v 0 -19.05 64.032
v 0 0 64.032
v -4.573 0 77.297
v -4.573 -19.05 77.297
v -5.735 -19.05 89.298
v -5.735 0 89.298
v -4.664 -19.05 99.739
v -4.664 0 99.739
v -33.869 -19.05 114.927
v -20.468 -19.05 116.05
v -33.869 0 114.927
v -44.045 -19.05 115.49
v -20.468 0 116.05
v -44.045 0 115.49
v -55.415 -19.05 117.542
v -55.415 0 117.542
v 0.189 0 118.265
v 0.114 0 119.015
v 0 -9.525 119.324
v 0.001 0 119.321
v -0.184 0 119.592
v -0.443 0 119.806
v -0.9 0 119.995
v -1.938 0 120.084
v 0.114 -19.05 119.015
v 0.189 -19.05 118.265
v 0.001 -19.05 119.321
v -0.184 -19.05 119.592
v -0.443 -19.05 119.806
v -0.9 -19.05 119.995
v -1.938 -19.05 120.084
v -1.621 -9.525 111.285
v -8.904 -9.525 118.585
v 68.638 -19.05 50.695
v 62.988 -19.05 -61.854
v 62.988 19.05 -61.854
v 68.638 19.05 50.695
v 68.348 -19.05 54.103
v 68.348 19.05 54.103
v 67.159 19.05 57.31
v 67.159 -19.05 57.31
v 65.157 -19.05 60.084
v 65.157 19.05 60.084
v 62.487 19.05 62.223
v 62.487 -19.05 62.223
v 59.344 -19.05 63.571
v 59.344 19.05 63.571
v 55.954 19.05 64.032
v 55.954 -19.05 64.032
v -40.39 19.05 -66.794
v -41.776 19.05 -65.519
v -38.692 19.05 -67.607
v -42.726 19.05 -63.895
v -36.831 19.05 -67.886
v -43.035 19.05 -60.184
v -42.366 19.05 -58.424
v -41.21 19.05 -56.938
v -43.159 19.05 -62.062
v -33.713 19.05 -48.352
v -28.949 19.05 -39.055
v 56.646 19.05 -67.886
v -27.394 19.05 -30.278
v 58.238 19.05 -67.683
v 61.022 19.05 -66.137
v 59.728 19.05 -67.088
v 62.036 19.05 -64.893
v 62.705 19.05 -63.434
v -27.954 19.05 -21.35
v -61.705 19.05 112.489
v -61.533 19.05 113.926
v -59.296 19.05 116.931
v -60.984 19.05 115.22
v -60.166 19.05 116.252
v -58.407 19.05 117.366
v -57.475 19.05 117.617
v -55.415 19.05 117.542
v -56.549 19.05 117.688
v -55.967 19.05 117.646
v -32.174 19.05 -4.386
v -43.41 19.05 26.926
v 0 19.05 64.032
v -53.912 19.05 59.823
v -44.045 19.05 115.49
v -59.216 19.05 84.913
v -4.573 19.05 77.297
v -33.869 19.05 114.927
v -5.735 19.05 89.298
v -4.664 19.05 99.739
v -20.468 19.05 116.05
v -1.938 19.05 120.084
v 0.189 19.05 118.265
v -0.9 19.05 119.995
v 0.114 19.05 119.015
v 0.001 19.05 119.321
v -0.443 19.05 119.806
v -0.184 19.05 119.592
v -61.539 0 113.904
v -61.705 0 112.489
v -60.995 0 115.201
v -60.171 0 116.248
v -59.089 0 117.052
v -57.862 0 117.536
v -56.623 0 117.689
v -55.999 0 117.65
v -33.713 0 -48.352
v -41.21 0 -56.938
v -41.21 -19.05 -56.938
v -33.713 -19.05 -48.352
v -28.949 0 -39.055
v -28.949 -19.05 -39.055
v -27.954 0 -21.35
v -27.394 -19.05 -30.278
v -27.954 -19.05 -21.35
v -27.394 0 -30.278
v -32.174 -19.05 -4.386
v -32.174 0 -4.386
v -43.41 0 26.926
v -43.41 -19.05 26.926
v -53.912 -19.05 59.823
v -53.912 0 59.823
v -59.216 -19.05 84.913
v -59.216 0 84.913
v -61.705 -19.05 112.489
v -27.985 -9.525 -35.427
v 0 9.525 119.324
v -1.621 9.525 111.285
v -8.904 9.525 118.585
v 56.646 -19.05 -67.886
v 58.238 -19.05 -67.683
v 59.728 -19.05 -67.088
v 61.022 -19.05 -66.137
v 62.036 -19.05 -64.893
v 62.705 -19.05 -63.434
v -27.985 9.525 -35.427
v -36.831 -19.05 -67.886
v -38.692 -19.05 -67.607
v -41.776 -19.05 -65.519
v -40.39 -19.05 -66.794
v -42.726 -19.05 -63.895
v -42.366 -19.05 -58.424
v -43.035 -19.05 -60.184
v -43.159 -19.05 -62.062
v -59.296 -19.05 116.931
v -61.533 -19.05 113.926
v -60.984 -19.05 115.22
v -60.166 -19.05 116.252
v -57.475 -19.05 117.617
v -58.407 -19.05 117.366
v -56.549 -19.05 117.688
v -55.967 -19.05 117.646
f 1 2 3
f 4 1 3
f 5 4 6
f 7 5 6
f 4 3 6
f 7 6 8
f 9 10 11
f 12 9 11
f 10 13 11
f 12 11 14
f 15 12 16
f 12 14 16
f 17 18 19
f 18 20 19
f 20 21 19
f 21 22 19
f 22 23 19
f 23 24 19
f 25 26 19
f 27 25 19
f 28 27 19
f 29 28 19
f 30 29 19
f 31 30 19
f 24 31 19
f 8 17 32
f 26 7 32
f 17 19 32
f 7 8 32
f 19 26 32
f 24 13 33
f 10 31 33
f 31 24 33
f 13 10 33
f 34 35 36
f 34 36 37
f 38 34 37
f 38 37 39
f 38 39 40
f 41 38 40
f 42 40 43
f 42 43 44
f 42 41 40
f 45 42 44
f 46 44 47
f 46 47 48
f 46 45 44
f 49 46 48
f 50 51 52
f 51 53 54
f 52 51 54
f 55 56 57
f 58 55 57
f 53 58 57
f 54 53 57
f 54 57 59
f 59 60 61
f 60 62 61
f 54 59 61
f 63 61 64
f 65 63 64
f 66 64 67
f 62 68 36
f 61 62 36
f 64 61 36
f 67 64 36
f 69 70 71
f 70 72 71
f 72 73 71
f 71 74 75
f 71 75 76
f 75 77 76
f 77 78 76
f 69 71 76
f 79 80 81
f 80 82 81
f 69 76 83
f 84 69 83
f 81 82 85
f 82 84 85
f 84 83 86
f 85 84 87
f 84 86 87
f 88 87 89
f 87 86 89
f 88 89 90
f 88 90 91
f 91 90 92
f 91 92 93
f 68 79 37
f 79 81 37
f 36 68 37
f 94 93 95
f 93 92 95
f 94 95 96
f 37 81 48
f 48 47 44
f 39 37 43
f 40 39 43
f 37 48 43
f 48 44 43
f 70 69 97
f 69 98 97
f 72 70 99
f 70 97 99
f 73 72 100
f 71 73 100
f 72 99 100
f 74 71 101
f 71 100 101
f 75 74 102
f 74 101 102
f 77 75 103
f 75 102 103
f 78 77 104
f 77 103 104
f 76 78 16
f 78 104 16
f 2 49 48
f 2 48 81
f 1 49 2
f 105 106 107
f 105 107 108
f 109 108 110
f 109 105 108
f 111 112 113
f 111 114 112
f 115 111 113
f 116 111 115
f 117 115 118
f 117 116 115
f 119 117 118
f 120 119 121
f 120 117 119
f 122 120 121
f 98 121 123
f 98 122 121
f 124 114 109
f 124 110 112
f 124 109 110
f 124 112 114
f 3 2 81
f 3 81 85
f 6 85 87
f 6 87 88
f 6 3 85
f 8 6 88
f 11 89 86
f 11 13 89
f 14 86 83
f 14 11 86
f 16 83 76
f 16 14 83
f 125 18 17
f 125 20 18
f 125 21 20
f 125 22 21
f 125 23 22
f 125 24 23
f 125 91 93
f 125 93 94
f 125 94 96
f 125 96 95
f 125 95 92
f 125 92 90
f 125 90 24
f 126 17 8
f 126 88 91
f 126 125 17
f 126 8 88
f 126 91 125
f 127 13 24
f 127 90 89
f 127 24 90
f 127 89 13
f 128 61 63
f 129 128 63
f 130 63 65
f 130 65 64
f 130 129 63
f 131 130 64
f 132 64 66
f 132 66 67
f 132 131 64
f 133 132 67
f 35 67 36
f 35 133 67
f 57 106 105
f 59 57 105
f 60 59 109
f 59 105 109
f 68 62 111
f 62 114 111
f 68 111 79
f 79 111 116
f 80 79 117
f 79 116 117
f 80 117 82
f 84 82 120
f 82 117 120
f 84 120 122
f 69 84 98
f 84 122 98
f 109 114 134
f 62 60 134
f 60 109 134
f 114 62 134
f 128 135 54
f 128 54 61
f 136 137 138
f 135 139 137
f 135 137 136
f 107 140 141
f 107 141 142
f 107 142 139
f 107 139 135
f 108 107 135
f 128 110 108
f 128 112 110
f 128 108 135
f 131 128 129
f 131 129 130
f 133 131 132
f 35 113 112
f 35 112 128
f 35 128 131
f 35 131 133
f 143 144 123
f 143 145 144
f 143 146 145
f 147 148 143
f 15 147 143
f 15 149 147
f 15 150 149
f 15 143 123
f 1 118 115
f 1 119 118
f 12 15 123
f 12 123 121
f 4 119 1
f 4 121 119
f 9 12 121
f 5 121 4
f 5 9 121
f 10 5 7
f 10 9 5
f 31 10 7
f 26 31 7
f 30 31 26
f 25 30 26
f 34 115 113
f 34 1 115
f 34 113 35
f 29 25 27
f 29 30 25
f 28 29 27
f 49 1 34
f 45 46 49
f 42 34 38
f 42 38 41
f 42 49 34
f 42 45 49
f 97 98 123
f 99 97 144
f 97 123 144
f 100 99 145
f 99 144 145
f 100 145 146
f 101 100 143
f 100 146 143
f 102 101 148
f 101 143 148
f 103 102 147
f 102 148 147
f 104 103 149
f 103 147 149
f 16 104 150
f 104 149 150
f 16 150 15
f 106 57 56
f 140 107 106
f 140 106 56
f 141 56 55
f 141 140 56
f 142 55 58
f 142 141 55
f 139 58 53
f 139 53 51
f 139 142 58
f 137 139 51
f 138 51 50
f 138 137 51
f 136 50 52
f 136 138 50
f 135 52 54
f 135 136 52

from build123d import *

# Parameters (mm, degrees)
F1_DEPTH = 19.05
F2_R     = 5.08


with BuildPart() as f1:
    # F0 (on Front) → F1 (new body, symmetric)
    with BuildSketch(Plane.XZ):
        with BuildLine():
            ThreePointArc((-41.2102176428, -56.9380209093), (-42.7262869342, -63.8945167146), (-36.8305512568, -67.8859576583))
            Line((-36.8305512568, -67.8859576583), (56.6456316932, -67.8859576583))
            ThreePointArc((56.6456316932, -67.8859576583), (61.0217420398, -66.1372790157), (62.9876442917, -61.8543539524))
            Line((62.9876442917, -61.8543539524), (68.6381038561, 50.6949640107))
            ThreePointArc((68.6381038561, 50.6949640107), (65.1567213738, 60.0839772923), (55.954078659, 64.031756599))
            Line((55.954078659, 64.031756599), (0, 64.031756599))
            add(Edge.make_bspline(
                [(0, 64.031756599), (-13.8958169074, 92.772193382), (18.9529467347, 138.9305901021), (-24.5397146791, 107.536368072), (-61.751320227, 119.3237975012)],
                knots=[0, 0, 0, 0, 0.4861927134, 1, 1, 1, 1], degree=3))
            add(Edge.make_bspline(
                [(-41.2102176428, -56.9380209093), (-35.2492907521, -51.2600673928), (-10.330751513, -19.1265381914), (-62.4997914355, 44.8085571184), (-61.751320227, 119.3237975012)],
                knots=[0.1516920821, 0.1516920821, 0.1516920821, 0.1516920821, 0.3399970952, 1, 1, 1, 1], degree=3))
        make_face()
    extrude(amount=F1_DEPTH, both=True)

    # F2
    f2_edges = [f1.edges().sort_by_distance(p)[0] for p in [
        (-61.75132, -9.525, 119.323798),
        (-61.75132, 9.525, 119.323798),
    ]]
    fillet(f2_edges, radius=F2_R)


solid = f1.part
